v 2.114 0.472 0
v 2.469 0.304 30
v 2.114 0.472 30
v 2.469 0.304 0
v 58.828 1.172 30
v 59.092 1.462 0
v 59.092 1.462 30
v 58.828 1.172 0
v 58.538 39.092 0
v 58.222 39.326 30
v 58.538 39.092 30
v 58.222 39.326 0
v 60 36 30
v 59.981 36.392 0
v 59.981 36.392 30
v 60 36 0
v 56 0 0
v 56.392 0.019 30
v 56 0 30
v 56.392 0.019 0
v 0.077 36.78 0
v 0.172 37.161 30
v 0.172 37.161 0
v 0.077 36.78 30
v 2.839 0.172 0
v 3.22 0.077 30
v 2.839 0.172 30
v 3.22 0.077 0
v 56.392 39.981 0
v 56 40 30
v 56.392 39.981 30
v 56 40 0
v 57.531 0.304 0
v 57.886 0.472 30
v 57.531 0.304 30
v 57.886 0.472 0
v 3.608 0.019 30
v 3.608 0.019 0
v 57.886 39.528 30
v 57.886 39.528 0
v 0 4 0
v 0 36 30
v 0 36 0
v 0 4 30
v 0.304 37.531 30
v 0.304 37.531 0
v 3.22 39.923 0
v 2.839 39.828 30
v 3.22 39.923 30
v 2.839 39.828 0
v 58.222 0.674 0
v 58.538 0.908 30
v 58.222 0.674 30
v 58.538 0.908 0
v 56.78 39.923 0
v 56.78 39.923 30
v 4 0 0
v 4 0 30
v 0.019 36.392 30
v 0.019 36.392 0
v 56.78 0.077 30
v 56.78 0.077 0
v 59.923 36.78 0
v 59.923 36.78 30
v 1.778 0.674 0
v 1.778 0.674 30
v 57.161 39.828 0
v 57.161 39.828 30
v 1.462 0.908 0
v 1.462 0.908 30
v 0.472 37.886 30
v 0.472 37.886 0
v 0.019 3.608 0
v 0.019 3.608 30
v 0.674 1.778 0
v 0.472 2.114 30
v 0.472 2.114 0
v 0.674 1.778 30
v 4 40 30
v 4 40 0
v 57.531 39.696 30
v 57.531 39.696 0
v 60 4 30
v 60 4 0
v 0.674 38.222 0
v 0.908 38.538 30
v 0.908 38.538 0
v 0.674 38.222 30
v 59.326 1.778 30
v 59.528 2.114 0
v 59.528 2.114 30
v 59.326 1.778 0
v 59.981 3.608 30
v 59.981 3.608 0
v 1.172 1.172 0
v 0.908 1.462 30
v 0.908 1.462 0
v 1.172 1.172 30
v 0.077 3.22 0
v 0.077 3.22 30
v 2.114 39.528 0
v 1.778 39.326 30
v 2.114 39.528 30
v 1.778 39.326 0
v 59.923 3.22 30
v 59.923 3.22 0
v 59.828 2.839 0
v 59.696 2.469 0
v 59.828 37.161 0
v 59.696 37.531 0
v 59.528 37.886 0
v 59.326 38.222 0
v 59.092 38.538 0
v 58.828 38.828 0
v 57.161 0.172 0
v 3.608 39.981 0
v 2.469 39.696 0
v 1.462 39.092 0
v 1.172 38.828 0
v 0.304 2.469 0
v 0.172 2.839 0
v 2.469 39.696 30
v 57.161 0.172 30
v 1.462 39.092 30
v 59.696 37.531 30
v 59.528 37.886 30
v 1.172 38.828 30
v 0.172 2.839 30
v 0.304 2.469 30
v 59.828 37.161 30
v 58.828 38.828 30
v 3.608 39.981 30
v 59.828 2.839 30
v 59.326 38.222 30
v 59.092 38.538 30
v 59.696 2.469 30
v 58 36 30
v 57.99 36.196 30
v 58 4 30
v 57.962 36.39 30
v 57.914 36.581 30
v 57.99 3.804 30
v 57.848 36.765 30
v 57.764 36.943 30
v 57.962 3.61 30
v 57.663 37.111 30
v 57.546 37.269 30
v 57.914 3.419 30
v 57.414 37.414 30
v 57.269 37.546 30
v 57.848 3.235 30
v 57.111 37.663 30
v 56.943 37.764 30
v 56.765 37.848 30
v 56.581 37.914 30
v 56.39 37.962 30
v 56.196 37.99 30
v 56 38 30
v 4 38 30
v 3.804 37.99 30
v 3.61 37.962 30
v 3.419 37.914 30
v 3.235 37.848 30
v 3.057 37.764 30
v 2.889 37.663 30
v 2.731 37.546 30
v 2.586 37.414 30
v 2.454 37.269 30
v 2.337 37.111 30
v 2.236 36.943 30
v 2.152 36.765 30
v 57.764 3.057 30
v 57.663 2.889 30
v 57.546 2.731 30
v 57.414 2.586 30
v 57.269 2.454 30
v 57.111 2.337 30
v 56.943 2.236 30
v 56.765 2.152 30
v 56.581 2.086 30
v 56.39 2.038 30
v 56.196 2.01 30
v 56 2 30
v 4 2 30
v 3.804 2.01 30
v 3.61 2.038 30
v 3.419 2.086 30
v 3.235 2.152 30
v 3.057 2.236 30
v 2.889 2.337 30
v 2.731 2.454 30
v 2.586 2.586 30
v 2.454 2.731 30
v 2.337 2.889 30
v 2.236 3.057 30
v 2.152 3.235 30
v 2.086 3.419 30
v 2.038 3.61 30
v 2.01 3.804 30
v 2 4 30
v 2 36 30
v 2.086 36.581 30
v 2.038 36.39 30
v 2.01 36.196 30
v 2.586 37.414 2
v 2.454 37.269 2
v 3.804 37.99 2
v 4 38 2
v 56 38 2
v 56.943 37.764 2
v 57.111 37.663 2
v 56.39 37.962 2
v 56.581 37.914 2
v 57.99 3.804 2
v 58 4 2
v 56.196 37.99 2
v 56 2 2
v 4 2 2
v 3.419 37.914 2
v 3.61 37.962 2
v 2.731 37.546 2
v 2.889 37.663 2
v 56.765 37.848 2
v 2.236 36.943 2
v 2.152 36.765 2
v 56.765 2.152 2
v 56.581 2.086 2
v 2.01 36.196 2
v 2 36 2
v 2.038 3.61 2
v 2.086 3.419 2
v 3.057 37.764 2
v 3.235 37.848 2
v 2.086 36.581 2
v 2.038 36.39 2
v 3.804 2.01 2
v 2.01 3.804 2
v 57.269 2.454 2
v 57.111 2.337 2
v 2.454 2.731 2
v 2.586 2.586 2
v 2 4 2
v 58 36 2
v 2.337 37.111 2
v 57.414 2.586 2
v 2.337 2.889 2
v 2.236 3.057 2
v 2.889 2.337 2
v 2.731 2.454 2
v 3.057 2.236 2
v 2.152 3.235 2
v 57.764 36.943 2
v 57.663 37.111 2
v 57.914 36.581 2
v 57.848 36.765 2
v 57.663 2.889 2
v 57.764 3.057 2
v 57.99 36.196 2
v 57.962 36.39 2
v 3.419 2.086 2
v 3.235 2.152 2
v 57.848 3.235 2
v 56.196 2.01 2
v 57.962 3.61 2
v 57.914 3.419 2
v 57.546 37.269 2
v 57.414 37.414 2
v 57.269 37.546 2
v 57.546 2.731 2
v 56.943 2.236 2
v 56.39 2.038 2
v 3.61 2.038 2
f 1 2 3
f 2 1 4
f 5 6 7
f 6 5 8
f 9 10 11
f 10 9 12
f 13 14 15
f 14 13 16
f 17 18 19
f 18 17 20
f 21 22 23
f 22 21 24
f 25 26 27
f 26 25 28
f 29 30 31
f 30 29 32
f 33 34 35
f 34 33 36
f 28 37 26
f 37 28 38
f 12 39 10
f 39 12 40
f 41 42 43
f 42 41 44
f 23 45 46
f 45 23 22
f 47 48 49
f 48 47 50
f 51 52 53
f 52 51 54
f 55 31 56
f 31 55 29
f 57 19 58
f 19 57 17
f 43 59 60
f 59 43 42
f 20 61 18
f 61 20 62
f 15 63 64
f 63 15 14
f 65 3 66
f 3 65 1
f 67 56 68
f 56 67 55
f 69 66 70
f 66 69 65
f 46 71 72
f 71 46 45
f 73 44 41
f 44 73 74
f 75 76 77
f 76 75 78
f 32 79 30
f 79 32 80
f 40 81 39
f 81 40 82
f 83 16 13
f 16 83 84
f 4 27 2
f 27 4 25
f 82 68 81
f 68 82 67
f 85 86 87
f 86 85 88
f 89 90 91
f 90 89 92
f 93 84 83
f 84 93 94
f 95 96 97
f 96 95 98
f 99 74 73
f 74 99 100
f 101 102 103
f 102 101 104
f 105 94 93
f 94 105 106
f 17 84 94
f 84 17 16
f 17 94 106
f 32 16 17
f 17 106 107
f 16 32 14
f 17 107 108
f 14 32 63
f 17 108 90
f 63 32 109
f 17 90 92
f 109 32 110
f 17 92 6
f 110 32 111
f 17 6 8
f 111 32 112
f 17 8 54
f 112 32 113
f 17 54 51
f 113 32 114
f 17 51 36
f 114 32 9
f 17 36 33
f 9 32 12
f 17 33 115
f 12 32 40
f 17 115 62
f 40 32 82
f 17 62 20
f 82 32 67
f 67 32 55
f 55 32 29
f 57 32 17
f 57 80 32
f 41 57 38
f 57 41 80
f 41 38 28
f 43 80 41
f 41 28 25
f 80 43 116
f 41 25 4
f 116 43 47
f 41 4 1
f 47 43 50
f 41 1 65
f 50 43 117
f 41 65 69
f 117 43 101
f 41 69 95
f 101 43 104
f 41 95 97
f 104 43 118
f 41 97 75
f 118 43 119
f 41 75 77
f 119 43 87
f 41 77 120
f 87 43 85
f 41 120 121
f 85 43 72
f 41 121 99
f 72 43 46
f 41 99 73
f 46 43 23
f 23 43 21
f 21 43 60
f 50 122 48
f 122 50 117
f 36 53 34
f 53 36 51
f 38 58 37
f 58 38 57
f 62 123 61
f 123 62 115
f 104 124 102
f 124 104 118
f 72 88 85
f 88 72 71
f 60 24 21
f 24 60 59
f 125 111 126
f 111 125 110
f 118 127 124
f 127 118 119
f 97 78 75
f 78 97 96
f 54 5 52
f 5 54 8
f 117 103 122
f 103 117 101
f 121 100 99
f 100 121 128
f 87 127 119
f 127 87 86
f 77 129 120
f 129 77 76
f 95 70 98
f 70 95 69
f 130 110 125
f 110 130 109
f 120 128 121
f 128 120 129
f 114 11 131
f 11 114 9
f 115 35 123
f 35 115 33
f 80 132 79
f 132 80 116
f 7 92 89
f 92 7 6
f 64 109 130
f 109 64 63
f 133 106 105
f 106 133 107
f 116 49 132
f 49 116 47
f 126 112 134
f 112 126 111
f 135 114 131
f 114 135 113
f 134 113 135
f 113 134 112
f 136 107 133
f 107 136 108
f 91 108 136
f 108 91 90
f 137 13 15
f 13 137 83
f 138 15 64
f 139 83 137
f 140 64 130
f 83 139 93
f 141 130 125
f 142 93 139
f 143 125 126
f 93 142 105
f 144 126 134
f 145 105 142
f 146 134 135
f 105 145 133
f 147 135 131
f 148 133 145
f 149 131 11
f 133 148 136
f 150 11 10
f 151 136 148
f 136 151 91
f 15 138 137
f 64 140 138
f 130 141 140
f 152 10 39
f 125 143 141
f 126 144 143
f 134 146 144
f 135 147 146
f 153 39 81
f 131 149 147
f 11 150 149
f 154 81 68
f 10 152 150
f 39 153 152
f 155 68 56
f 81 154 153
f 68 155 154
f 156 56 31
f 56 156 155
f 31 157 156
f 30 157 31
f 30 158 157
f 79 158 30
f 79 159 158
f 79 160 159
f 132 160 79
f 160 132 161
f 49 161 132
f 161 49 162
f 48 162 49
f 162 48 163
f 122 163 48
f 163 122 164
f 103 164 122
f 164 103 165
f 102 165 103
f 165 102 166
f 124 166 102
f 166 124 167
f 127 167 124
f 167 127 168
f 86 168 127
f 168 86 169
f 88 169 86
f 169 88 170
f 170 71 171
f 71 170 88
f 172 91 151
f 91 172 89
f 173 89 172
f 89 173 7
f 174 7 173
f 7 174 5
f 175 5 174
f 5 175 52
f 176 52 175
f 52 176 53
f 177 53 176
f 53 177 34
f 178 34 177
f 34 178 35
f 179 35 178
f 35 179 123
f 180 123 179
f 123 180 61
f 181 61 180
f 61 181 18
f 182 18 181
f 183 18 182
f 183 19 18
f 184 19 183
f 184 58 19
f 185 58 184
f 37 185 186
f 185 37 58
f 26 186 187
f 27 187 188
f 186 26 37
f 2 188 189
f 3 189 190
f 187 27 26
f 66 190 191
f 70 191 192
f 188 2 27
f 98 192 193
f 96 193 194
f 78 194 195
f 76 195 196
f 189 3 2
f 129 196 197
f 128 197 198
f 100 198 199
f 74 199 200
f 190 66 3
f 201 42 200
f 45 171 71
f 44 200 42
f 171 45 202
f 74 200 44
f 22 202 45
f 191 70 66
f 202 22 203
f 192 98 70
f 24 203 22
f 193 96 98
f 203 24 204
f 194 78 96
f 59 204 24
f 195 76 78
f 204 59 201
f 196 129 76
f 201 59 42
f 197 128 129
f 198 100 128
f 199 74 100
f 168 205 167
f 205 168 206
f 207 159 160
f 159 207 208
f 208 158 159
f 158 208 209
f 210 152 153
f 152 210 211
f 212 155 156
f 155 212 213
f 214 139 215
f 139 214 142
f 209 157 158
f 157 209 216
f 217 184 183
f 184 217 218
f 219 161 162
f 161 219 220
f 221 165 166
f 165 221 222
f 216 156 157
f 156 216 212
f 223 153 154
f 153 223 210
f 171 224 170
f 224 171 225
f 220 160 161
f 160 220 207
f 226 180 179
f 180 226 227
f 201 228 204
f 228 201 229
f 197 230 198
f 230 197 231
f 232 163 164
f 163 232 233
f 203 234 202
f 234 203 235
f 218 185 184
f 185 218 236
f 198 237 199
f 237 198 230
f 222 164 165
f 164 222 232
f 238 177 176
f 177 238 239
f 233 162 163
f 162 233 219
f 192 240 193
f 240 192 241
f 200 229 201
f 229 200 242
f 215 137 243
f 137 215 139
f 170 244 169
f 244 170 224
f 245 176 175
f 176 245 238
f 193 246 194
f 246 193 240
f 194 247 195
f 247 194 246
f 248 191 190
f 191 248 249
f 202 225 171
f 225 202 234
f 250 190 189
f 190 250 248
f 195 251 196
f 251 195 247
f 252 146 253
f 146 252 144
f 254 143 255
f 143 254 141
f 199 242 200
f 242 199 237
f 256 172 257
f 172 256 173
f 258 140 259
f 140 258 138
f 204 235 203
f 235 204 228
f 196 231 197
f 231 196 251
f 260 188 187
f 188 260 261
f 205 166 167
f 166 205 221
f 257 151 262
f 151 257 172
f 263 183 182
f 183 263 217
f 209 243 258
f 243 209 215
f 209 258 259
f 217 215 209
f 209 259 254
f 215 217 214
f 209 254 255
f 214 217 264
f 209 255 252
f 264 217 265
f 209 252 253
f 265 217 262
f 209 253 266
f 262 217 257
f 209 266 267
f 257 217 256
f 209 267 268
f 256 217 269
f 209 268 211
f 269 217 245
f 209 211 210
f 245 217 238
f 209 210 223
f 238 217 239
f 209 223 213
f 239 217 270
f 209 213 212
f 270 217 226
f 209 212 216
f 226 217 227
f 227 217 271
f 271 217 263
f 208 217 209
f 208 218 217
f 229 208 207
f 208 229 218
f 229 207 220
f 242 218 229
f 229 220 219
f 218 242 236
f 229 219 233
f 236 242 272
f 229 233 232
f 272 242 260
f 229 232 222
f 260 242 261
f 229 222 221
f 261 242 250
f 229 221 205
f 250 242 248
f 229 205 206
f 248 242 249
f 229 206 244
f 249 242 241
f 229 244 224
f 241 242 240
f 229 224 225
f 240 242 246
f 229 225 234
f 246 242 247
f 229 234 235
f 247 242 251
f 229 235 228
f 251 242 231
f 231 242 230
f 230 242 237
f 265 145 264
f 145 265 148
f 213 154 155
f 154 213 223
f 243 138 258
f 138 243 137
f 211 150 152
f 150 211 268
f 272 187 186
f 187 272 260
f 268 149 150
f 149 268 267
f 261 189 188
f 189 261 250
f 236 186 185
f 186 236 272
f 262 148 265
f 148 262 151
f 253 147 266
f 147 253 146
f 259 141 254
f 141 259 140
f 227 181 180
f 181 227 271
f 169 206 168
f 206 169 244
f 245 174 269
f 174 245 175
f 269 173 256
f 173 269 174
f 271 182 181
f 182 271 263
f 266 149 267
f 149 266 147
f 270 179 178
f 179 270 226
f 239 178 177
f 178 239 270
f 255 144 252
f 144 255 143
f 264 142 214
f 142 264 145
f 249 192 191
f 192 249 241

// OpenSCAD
// --- Parámetros ---
width = 60;
depth = 40;
height = 30;
thickness = 2.0;
corner_radius = 4; // 0 para bordes angulados
is_lid = false;    // Cambiar a true para generar la tapa

$fn = 64;

module rounded_box(w, d, h, r) {
    if (r > 0) {
        hull() {
            translate([r, r, 0]) cylinder(r=r, h=h);
            translate([w-r, r, 0]) cylinder(r=r, h=h);
            translate([r, d-r, 0]) cylinder(r=r, h=h);
            translate([w-r, d-r, 0]) cylinder(r=r, h=h);
        }
    } else {
        cube([w, d, h]);
    }
}

if (!is_lid) {
    // Cuerpo de la caja
    difference() {
        rounded_box(width, depth, height, corner_radius);
        translate([thickness, thickness, thickness])
            rounded_box(width - thickness*2, depth - thickness*2, height, corner_radius - thickness);
    }
} else {
    // Tapa con tolerancia para encaje (0.2mm)
    difference() {
        rounded_box(width + 0.4, depth + 0.4, thickness * 2, corner_radius + 0.2);
        translate([thickness/2, thickness/2, thickness])
            rounded_box(width - thickness/2 + 0.4, depth - thickness/2 + 0.4, thickness + 1, corner_radius);
    }
}
